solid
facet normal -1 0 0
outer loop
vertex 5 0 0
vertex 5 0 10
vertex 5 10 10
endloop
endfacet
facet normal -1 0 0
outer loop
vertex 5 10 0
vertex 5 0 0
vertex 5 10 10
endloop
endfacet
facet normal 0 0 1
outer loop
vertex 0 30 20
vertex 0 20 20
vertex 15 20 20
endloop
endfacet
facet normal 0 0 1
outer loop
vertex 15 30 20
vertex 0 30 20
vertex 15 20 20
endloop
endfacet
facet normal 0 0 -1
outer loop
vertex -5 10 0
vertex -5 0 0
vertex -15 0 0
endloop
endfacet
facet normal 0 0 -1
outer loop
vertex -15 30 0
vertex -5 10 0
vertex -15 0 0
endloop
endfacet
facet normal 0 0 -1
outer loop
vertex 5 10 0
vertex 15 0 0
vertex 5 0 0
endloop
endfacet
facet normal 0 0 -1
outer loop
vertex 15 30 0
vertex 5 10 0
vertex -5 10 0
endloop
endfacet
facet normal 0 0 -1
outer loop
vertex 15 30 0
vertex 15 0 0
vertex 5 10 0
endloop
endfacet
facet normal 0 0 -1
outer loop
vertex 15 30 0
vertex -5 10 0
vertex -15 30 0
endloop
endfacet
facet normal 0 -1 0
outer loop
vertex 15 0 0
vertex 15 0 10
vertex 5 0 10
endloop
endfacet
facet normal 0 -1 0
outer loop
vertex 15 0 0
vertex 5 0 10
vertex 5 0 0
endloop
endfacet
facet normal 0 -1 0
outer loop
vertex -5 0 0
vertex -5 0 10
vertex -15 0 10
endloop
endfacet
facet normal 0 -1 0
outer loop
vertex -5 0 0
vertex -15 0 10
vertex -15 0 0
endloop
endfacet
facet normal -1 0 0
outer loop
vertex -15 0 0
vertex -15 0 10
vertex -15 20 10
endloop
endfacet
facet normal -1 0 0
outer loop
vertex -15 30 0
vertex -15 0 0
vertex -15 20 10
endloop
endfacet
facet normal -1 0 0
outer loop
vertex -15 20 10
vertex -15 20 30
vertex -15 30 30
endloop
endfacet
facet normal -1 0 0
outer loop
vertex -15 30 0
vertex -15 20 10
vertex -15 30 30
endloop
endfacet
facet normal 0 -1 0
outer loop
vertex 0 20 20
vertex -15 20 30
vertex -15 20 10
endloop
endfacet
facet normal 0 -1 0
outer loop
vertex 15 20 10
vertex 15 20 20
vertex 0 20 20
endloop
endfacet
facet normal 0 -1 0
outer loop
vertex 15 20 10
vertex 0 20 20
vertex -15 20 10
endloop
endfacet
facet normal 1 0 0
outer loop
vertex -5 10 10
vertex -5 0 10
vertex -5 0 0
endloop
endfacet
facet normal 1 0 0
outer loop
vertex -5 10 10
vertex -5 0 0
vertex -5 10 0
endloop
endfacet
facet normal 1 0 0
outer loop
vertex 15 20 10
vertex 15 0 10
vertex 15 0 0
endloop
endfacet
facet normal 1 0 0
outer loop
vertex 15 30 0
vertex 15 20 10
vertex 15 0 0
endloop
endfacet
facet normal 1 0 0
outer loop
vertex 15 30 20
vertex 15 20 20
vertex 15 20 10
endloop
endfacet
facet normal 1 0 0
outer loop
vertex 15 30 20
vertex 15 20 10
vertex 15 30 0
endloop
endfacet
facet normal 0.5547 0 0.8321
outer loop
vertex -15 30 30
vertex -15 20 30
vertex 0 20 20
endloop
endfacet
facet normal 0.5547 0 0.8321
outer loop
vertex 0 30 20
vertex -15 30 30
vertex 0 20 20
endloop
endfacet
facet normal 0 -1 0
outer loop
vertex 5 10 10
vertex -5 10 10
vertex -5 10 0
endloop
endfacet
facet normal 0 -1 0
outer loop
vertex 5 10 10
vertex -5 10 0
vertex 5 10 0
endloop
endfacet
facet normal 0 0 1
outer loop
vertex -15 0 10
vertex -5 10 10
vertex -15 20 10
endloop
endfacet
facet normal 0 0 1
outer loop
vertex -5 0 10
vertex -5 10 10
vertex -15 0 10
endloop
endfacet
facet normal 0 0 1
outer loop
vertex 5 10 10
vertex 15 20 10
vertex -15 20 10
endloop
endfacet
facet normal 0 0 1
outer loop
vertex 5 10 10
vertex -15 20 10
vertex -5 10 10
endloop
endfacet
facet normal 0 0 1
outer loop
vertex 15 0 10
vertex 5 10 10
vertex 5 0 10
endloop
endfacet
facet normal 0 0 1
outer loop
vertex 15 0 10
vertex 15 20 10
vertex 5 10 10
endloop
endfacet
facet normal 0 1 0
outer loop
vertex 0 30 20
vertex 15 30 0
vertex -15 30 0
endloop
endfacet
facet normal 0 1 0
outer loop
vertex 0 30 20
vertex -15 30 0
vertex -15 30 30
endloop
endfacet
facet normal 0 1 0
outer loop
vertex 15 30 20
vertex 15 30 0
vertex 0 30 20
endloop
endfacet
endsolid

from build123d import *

# Parameters (mm, degrees)
F1_DEPTH = 15
F4_DEPTH = 10.001
F3_W     = 10
F3_H     = 10
F5_DEPTH = 10.001


with BuildPart() as f1:
    # F0 (on Right) → F1 (new body, symmetric)
    with BuildSketch(Plane.YZ):
        Polygon((0, 10), (0, 0), (30, 0), (30, 30), (20, 30), (20, 10), align=None)
    extrude(amount=F1_DEPTH, both=True)

    # F2 (on face) → F4 (cut, through all)
    with BuildSketch(Plane.XZ.offset(-20)):
        Polygon((15, 30), (-15, 30), (0, 20), (15, 20), align=None)
    extrude(amount=-F4_DEPTH, mode=Mode.SUBTRACT)

    # F3 (on face) → F5 (cut, through all)
    with BuildSketch(Plane.XY.offset(10)):
        with Locations((0, 5)):
            Rectangle(F3_W, F3_H)
    extrude(amount=-F5_DEPTH, mode=Mode.SUBTRACT)


solid = f1.part
